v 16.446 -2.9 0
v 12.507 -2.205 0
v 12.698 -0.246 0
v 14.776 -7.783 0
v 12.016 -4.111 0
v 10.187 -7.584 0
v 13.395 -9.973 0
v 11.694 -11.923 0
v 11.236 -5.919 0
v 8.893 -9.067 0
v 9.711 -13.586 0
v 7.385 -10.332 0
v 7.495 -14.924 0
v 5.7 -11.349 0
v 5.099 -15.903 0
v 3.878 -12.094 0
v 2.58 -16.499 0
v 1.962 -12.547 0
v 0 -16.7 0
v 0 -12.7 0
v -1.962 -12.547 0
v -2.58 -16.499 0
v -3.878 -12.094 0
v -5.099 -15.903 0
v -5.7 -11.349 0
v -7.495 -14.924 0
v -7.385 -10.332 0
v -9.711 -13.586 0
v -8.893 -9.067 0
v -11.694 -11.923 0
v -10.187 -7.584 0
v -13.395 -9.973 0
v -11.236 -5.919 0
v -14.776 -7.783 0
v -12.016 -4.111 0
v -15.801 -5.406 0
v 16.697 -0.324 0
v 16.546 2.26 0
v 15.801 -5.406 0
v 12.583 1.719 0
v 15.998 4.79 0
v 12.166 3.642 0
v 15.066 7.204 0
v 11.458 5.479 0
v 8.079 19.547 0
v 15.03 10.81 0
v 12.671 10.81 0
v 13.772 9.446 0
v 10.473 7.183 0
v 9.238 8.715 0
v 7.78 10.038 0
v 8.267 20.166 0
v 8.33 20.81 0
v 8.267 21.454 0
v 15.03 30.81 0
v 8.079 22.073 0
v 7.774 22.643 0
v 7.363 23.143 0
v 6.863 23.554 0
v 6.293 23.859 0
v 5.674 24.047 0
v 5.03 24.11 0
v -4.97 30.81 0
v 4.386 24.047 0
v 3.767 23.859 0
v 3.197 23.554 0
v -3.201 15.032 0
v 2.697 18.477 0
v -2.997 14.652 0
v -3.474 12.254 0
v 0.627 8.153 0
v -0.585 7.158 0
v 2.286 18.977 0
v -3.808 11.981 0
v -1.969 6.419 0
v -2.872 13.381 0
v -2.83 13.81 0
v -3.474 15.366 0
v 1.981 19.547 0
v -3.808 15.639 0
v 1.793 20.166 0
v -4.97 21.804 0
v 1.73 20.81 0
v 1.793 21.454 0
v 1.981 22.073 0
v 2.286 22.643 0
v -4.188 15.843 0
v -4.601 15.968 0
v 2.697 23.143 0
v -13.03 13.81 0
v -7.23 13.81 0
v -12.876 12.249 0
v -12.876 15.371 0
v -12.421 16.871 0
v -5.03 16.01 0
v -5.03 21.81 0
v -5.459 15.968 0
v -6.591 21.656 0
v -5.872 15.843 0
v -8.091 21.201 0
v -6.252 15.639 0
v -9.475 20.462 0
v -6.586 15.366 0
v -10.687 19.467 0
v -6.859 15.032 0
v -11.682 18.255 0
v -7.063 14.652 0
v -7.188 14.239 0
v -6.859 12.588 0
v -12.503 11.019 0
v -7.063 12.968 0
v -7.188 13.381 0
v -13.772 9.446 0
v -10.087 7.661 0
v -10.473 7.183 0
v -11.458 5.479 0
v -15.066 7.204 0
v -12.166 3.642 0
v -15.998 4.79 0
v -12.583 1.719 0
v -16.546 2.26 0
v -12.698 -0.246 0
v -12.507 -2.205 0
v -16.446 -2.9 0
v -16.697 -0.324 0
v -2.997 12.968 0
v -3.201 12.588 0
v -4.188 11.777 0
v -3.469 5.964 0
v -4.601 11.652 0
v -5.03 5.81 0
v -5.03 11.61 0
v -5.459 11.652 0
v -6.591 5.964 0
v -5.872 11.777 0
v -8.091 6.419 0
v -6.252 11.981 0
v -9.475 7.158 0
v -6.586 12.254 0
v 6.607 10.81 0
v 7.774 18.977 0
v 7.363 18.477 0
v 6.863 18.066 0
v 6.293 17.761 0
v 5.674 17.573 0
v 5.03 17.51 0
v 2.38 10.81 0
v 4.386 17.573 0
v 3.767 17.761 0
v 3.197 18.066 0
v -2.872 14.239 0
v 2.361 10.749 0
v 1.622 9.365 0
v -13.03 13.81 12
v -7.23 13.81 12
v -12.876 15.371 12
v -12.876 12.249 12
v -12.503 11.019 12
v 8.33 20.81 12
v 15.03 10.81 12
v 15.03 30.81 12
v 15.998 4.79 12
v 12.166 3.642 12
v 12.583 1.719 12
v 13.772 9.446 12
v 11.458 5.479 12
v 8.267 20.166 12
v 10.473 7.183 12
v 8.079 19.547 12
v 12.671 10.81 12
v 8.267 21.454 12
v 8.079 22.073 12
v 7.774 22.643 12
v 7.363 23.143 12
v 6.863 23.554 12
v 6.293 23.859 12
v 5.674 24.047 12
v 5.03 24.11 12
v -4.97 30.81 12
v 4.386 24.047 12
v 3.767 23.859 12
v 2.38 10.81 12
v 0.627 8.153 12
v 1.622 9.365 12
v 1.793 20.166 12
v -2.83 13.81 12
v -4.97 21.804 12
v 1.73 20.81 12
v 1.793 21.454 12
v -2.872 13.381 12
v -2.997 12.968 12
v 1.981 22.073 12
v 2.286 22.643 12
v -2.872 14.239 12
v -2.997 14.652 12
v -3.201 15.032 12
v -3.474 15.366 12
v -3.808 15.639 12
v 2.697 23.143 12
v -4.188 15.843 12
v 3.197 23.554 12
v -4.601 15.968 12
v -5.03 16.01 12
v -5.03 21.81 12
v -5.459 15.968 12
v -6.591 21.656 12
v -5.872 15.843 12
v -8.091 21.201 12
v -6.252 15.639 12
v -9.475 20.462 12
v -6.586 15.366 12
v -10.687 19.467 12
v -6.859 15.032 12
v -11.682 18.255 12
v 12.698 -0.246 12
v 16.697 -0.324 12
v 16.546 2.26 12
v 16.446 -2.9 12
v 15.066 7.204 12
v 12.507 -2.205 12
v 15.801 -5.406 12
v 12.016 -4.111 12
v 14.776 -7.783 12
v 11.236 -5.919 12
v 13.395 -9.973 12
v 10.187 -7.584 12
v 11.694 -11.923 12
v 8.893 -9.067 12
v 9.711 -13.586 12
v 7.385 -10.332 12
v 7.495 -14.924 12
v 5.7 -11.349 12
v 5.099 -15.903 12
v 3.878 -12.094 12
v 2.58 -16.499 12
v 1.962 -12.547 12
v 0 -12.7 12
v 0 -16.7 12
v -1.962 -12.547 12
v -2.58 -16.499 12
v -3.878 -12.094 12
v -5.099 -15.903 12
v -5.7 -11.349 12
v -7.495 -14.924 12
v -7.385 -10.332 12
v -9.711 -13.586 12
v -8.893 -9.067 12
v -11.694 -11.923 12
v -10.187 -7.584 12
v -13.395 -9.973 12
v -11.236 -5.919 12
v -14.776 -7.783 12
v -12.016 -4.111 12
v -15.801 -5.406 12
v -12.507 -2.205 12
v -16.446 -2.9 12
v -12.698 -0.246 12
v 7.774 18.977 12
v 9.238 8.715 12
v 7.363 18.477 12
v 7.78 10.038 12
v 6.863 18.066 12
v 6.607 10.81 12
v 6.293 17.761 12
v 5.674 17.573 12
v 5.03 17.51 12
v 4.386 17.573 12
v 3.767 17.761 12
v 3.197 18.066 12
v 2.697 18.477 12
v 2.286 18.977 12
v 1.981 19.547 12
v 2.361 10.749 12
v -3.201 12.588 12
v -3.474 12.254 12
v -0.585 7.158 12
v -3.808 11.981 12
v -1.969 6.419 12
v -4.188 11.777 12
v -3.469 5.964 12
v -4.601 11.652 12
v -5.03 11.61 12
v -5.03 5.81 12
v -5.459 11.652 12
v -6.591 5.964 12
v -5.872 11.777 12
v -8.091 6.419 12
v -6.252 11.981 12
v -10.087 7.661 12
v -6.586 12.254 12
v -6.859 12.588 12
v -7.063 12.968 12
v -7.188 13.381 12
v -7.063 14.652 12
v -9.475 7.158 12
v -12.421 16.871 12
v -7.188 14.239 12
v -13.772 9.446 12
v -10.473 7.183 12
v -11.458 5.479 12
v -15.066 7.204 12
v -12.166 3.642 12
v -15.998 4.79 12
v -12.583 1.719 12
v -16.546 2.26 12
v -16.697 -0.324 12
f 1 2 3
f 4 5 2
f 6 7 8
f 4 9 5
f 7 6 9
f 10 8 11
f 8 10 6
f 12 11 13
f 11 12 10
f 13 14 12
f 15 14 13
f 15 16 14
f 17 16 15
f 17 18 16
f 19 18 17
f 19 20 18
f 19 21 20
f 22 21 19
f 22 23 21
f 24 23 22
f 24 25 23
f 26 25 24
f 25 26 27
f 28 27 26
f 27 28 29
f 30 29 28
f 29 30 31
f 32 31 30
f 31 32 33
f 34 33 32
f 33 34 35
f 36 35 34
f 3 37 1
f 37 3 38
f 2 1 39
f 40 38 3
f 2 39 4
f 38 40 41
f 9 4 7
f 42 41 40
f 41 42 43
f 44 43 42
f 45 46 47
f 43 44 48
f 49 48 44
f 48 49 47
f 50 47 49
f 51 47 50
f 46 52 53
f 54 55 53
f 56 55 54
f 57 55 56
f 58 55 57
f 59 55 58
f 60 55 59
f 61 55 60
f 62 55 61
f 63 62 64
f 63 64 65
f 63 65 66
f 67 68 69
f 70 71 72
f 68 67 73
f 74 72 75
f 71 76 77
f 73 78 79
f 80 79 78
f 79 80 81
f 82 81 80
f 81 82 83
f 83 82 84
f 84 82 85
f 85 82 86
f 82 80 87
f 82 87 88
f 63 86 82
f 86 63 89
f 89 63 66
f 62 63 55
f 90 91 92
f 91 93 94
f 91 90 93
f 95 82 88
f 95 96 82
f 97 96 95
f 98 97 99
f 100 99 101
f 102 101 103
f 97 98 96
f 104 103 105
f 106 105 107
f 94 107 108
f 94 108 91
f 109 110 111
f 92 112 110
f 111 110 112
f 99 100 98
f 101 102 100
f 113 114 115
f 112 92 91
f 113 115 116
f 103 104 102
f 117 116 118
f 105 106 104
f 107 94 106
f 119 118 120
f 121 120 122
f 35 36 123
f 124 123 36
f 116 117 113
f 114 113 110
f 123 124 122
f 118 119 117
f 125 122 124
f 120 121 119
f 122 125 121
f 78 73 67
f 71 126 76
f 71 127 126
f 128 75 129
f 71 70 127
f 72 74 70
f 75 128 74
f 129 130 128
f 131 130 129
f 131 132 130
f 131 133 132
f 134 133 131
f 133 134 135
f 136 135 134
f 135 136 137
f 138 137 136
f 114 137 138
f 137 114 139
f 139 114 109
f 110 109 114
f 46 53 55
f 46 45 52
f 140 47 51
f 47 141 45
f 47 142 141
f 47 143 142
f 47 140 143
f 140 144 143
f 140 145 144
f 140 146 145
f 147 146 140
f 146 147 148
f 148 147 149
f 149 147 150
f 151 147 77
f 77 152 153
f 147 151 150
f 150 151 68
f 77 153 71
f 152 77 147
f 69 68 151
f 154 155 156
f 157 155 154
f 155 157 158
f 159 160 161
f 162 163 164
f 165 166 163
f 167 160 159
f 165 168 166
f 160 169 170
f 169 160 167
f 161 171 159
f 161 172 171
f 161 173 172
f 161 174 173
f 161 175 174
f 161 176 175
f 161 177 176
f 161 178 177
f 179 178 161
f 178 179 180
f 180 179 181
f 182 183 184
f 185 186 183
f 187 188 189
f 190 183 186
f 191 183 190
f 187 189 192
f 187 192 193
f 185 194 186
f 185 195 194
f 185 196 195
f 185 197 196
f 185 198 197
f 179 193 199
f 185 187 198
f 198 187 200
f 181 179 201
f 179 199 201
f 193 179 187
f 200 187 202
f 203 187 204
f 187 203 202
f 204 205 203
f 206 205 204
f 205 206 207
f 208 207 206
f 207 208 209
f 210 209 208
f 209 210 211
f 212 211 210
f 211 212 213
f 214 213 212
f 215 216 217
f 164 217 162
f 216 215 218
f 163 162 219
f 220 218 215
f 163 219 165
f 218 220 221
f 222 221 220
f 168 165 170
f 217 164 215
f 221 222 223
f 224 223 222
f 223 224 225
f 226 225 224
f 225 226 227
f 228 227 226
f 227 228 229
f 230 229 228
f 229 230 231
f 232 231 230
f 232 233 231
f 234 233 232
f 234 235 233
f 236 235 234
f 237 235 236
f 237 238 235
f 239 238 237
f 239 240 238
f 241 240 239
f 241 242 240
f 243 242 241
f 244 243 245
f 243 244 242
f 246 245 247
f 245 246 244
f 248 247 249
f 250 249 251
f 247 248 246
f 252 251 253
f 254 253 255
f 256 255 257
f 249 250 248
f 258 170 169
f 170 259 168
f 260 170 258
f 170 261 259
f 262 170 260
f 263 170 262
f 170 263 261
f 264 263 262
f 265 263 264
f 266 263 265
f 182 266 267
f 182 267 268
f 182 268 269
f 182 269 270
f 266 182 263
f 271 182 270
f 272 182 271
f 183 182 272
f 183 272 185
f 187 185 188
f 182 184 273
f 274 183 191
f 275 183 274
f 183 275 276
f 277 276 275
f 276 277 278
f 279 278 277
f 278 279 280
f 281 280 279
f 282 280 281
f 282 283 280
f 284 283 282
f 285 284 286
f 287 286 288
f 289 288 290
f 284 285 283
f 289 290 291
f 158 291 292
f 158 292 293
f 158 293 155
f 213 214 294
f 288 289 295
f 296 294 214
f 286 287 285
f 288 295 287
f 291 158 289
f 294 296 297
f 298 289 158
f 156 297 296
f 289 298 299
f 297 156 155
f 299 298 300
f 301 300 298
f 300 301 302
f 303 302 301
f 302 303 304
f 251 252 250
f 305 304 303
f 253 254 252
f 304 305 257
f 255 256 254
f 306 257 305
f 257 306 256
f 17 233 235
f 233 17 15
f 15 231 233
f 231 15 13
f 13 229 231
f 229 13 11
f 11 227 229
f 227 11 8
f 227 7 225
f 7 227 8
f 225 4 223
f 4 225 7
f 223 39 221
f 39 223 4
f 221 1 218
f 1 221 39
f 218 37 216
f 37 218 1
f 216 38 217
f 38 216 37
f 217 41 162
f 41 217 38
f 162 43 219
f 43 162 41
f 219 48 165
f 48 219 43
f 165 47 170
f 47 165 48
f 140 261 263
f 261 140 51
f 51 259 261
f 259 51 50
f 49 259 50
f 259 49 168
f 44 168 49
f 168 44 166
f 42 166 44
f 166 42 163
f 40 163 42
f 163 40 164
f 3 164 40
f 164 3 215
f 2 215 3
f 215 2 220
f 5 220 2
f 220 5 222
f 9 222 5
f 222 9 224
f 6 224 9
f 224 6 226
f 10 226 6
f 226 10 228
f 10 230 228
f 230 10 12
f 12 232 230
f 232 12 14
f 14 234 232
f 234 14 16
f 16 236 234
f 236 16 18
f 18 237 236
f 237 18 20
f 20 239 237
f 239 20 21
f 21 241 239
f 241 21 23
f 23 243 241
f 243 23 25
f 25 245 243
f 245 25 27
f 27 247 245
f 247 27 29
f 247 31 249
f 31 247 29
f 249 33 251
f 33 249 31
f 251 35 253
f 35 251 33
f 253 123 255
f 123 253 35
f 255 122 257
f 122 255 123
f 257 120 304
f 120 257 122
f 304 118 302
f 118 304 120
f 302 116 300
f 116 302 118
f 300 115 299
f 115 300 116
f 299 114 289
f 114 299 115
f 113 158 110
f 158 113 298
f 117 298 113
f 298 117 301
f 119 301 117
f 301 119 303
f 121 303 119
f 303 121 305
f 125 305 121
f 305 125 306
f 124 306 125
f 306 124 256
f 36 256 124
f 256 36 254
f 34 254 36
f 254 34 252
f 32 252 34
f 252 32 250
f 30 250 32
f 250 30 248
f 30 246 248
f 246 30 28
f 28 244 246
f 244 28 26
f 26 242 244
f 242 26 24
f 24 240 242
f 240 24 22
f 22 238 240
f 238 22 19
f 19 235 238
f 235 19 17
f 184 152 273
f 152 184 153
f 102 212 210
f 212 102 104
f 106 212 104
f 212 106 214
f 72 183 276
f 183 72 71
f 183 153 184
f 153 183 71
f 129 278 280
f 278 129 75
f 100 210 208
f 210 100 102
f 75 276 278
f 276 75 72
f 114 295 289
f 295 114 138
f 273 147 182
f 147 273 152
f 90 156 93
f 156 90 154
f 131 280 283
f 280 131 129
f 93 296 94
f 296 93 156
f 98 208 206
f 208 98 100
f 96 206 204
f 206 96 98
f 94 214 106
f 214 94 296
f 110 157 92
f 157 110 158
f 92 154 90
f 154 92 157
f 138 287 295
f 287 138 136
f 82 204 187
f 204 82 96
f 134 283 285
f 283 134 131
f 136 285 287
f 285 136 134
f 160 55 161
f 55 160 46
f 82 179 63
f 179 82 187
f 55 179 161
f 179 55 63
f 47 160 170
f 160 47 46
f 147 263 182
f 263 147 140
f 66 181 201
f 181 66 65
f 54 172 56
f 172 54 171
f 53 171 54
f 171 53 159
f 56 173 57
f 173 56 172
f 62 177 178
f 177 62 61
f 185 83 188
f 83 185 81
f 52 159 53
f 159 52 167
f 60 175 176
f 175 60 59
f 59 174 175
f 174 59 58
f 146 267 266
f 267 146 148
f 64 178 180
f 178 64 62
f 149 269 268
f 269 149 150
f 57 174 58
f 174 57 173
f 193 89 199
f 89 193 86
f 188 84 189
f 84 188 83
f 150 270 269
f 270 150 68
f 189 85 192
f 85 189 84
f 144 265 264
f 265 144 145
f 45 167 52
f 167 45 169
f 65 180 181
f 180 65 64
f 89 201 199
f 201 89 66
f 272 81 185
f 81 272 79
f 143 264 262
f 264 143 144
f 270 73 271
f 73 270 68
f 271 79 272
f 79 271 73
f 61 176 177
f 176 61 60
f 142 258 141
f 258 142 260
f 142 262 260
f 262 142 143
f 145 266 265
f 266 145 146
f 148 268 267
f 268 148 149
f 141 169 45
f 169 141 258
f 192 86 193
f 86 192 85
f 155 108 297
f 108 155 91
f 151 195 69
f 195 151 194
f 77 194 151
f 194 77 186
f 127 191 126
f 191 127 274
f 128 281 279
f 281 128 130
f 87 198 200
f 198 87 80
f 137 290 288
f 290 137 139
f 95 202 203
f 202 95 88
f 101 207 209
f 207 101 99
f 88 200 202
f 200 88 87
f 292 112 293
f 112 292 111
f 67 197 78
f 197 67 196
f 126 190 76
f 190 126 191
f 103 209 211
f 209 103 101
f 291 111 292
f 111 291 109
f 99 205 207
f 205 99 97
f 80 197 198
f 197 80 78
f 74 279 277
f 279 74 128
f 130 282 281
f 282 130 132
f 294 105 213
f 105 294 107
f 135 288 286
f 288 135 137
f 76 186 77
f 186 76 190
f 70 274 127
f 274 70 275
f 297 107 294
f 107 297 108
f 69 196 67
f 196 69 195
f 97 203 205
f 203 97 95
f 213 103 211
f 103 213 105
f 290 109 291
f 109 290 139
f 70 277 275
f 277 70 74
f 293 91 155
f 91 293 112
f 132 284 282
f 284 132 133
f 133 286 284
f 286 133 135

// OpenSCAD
$fn = 32;

// ----------------------------------------------------------------------
// Pipe clamp: 33.4 mm ring, 4 mm wall, 12 mm wide
// ----------------------------------------------------------------------

// --- parameters (mm) ---
outer_r = 16.7;           // clamp outside radius
inner_r = 12.7;           // pipe bore radius
band = 4;                 // band thickness
clamp_w = 12;             // clamp width
opening = 40;             // opening angle between the ends
lug_w = 20;               // lug width
lug_len = 20;             // lug length
bolt_d = 6.6;             // bolt hole
knuckle_d = 16;           // hinge knuckle diameter
pin_d = 4.4;              // hinge pin hole

clamp_profile = [[-5.712, 15.693], [-8.068, 14.622], [-10.23, 13.2], [-12.147, 11.46], [-13.772, 9.446], [-15.066, 7.204], [-15.998, 4.79], [-16.546, 2.26], [-16.697, -0.324], [-16.446, -2.9], [-15.801, -5.406], [-14.776, -7.783], [-13.395, -9.973], [-11.694, -11.923], [-9.711, -13.586], [-7.495, -14.924], [-5.099, -15.903], [-2.58, -16.499], [0, -16.7], [2.58, -16.499], [5.099, -15.903], [7.495, -14.924], [9.711, -13.586], [11.694, -11.923], [13.395, -9.973], [14.776, -7.783], [15.801, -5.406], [16.446, -2.9], [16.697, -0.324], [16.546, 2.26], [15.998, 4.79], [15.066, 7.204], [13.772, 9.446], [12.147, 11.46], [10.23, 13.2], [8.068, 14.622], [5.712, 15.693], [4.344, 11.934], [6.136, 11.12], [7.78, 10.038], [9.238, 8.715], [10.473, 7.183], [11.458, 5.479], [12.166, 3.642], [12.583, 1.719], [12.698, -0.246], [12.507, -2.205], [12.016, -4.111], [11.236, -5.919], [10.187, -7.584], [8.893, -9.067], [7.385, -10.332], [5.7, -11.349], [3.878, -12.094], [1.962, -12.547], [0, -12.7], [-1.962, -12.547], [-3.878, -12.094], [-5.7, -11.349], [-7.385, -10.332], [-8.893, -9.067], [-10.187, -7.584], [-11.236, -5.919], [-12.016, -4.111], [-12.507, -2.205], [-12.698, -0.246], [-12.583, 1.719], [-12.166, 3.642], [-11.458, 5.479], [-10.473, 7.183], [-9.238, 8.715], [-7.78, 10.038], [-6.136, 11.12], [-4.344, 11.934]];

difference() {
  union() {
    linear_extrude(height = clamp_w) polygon(clamp_profile);
    /* hinge knuckle, sunk 2 mm into the band end */
    translate([-5.03, 13.81, 0]) cylinder(h = clamp_w, d = knuckle_d);
    /* bolt lug on the other end */
    translate([-4.97, 10.81, 0]) cube([lug_w, 20, clamp_w]);
  }
  translate([5.03, 20.81, -2.5]) cylinder(h = clamp_w + 5, d = bolt_d);
  translate([-5.03, 13.81, -2.5]) cylinder(h = clamp_w + 5, d = pin_d);
}
